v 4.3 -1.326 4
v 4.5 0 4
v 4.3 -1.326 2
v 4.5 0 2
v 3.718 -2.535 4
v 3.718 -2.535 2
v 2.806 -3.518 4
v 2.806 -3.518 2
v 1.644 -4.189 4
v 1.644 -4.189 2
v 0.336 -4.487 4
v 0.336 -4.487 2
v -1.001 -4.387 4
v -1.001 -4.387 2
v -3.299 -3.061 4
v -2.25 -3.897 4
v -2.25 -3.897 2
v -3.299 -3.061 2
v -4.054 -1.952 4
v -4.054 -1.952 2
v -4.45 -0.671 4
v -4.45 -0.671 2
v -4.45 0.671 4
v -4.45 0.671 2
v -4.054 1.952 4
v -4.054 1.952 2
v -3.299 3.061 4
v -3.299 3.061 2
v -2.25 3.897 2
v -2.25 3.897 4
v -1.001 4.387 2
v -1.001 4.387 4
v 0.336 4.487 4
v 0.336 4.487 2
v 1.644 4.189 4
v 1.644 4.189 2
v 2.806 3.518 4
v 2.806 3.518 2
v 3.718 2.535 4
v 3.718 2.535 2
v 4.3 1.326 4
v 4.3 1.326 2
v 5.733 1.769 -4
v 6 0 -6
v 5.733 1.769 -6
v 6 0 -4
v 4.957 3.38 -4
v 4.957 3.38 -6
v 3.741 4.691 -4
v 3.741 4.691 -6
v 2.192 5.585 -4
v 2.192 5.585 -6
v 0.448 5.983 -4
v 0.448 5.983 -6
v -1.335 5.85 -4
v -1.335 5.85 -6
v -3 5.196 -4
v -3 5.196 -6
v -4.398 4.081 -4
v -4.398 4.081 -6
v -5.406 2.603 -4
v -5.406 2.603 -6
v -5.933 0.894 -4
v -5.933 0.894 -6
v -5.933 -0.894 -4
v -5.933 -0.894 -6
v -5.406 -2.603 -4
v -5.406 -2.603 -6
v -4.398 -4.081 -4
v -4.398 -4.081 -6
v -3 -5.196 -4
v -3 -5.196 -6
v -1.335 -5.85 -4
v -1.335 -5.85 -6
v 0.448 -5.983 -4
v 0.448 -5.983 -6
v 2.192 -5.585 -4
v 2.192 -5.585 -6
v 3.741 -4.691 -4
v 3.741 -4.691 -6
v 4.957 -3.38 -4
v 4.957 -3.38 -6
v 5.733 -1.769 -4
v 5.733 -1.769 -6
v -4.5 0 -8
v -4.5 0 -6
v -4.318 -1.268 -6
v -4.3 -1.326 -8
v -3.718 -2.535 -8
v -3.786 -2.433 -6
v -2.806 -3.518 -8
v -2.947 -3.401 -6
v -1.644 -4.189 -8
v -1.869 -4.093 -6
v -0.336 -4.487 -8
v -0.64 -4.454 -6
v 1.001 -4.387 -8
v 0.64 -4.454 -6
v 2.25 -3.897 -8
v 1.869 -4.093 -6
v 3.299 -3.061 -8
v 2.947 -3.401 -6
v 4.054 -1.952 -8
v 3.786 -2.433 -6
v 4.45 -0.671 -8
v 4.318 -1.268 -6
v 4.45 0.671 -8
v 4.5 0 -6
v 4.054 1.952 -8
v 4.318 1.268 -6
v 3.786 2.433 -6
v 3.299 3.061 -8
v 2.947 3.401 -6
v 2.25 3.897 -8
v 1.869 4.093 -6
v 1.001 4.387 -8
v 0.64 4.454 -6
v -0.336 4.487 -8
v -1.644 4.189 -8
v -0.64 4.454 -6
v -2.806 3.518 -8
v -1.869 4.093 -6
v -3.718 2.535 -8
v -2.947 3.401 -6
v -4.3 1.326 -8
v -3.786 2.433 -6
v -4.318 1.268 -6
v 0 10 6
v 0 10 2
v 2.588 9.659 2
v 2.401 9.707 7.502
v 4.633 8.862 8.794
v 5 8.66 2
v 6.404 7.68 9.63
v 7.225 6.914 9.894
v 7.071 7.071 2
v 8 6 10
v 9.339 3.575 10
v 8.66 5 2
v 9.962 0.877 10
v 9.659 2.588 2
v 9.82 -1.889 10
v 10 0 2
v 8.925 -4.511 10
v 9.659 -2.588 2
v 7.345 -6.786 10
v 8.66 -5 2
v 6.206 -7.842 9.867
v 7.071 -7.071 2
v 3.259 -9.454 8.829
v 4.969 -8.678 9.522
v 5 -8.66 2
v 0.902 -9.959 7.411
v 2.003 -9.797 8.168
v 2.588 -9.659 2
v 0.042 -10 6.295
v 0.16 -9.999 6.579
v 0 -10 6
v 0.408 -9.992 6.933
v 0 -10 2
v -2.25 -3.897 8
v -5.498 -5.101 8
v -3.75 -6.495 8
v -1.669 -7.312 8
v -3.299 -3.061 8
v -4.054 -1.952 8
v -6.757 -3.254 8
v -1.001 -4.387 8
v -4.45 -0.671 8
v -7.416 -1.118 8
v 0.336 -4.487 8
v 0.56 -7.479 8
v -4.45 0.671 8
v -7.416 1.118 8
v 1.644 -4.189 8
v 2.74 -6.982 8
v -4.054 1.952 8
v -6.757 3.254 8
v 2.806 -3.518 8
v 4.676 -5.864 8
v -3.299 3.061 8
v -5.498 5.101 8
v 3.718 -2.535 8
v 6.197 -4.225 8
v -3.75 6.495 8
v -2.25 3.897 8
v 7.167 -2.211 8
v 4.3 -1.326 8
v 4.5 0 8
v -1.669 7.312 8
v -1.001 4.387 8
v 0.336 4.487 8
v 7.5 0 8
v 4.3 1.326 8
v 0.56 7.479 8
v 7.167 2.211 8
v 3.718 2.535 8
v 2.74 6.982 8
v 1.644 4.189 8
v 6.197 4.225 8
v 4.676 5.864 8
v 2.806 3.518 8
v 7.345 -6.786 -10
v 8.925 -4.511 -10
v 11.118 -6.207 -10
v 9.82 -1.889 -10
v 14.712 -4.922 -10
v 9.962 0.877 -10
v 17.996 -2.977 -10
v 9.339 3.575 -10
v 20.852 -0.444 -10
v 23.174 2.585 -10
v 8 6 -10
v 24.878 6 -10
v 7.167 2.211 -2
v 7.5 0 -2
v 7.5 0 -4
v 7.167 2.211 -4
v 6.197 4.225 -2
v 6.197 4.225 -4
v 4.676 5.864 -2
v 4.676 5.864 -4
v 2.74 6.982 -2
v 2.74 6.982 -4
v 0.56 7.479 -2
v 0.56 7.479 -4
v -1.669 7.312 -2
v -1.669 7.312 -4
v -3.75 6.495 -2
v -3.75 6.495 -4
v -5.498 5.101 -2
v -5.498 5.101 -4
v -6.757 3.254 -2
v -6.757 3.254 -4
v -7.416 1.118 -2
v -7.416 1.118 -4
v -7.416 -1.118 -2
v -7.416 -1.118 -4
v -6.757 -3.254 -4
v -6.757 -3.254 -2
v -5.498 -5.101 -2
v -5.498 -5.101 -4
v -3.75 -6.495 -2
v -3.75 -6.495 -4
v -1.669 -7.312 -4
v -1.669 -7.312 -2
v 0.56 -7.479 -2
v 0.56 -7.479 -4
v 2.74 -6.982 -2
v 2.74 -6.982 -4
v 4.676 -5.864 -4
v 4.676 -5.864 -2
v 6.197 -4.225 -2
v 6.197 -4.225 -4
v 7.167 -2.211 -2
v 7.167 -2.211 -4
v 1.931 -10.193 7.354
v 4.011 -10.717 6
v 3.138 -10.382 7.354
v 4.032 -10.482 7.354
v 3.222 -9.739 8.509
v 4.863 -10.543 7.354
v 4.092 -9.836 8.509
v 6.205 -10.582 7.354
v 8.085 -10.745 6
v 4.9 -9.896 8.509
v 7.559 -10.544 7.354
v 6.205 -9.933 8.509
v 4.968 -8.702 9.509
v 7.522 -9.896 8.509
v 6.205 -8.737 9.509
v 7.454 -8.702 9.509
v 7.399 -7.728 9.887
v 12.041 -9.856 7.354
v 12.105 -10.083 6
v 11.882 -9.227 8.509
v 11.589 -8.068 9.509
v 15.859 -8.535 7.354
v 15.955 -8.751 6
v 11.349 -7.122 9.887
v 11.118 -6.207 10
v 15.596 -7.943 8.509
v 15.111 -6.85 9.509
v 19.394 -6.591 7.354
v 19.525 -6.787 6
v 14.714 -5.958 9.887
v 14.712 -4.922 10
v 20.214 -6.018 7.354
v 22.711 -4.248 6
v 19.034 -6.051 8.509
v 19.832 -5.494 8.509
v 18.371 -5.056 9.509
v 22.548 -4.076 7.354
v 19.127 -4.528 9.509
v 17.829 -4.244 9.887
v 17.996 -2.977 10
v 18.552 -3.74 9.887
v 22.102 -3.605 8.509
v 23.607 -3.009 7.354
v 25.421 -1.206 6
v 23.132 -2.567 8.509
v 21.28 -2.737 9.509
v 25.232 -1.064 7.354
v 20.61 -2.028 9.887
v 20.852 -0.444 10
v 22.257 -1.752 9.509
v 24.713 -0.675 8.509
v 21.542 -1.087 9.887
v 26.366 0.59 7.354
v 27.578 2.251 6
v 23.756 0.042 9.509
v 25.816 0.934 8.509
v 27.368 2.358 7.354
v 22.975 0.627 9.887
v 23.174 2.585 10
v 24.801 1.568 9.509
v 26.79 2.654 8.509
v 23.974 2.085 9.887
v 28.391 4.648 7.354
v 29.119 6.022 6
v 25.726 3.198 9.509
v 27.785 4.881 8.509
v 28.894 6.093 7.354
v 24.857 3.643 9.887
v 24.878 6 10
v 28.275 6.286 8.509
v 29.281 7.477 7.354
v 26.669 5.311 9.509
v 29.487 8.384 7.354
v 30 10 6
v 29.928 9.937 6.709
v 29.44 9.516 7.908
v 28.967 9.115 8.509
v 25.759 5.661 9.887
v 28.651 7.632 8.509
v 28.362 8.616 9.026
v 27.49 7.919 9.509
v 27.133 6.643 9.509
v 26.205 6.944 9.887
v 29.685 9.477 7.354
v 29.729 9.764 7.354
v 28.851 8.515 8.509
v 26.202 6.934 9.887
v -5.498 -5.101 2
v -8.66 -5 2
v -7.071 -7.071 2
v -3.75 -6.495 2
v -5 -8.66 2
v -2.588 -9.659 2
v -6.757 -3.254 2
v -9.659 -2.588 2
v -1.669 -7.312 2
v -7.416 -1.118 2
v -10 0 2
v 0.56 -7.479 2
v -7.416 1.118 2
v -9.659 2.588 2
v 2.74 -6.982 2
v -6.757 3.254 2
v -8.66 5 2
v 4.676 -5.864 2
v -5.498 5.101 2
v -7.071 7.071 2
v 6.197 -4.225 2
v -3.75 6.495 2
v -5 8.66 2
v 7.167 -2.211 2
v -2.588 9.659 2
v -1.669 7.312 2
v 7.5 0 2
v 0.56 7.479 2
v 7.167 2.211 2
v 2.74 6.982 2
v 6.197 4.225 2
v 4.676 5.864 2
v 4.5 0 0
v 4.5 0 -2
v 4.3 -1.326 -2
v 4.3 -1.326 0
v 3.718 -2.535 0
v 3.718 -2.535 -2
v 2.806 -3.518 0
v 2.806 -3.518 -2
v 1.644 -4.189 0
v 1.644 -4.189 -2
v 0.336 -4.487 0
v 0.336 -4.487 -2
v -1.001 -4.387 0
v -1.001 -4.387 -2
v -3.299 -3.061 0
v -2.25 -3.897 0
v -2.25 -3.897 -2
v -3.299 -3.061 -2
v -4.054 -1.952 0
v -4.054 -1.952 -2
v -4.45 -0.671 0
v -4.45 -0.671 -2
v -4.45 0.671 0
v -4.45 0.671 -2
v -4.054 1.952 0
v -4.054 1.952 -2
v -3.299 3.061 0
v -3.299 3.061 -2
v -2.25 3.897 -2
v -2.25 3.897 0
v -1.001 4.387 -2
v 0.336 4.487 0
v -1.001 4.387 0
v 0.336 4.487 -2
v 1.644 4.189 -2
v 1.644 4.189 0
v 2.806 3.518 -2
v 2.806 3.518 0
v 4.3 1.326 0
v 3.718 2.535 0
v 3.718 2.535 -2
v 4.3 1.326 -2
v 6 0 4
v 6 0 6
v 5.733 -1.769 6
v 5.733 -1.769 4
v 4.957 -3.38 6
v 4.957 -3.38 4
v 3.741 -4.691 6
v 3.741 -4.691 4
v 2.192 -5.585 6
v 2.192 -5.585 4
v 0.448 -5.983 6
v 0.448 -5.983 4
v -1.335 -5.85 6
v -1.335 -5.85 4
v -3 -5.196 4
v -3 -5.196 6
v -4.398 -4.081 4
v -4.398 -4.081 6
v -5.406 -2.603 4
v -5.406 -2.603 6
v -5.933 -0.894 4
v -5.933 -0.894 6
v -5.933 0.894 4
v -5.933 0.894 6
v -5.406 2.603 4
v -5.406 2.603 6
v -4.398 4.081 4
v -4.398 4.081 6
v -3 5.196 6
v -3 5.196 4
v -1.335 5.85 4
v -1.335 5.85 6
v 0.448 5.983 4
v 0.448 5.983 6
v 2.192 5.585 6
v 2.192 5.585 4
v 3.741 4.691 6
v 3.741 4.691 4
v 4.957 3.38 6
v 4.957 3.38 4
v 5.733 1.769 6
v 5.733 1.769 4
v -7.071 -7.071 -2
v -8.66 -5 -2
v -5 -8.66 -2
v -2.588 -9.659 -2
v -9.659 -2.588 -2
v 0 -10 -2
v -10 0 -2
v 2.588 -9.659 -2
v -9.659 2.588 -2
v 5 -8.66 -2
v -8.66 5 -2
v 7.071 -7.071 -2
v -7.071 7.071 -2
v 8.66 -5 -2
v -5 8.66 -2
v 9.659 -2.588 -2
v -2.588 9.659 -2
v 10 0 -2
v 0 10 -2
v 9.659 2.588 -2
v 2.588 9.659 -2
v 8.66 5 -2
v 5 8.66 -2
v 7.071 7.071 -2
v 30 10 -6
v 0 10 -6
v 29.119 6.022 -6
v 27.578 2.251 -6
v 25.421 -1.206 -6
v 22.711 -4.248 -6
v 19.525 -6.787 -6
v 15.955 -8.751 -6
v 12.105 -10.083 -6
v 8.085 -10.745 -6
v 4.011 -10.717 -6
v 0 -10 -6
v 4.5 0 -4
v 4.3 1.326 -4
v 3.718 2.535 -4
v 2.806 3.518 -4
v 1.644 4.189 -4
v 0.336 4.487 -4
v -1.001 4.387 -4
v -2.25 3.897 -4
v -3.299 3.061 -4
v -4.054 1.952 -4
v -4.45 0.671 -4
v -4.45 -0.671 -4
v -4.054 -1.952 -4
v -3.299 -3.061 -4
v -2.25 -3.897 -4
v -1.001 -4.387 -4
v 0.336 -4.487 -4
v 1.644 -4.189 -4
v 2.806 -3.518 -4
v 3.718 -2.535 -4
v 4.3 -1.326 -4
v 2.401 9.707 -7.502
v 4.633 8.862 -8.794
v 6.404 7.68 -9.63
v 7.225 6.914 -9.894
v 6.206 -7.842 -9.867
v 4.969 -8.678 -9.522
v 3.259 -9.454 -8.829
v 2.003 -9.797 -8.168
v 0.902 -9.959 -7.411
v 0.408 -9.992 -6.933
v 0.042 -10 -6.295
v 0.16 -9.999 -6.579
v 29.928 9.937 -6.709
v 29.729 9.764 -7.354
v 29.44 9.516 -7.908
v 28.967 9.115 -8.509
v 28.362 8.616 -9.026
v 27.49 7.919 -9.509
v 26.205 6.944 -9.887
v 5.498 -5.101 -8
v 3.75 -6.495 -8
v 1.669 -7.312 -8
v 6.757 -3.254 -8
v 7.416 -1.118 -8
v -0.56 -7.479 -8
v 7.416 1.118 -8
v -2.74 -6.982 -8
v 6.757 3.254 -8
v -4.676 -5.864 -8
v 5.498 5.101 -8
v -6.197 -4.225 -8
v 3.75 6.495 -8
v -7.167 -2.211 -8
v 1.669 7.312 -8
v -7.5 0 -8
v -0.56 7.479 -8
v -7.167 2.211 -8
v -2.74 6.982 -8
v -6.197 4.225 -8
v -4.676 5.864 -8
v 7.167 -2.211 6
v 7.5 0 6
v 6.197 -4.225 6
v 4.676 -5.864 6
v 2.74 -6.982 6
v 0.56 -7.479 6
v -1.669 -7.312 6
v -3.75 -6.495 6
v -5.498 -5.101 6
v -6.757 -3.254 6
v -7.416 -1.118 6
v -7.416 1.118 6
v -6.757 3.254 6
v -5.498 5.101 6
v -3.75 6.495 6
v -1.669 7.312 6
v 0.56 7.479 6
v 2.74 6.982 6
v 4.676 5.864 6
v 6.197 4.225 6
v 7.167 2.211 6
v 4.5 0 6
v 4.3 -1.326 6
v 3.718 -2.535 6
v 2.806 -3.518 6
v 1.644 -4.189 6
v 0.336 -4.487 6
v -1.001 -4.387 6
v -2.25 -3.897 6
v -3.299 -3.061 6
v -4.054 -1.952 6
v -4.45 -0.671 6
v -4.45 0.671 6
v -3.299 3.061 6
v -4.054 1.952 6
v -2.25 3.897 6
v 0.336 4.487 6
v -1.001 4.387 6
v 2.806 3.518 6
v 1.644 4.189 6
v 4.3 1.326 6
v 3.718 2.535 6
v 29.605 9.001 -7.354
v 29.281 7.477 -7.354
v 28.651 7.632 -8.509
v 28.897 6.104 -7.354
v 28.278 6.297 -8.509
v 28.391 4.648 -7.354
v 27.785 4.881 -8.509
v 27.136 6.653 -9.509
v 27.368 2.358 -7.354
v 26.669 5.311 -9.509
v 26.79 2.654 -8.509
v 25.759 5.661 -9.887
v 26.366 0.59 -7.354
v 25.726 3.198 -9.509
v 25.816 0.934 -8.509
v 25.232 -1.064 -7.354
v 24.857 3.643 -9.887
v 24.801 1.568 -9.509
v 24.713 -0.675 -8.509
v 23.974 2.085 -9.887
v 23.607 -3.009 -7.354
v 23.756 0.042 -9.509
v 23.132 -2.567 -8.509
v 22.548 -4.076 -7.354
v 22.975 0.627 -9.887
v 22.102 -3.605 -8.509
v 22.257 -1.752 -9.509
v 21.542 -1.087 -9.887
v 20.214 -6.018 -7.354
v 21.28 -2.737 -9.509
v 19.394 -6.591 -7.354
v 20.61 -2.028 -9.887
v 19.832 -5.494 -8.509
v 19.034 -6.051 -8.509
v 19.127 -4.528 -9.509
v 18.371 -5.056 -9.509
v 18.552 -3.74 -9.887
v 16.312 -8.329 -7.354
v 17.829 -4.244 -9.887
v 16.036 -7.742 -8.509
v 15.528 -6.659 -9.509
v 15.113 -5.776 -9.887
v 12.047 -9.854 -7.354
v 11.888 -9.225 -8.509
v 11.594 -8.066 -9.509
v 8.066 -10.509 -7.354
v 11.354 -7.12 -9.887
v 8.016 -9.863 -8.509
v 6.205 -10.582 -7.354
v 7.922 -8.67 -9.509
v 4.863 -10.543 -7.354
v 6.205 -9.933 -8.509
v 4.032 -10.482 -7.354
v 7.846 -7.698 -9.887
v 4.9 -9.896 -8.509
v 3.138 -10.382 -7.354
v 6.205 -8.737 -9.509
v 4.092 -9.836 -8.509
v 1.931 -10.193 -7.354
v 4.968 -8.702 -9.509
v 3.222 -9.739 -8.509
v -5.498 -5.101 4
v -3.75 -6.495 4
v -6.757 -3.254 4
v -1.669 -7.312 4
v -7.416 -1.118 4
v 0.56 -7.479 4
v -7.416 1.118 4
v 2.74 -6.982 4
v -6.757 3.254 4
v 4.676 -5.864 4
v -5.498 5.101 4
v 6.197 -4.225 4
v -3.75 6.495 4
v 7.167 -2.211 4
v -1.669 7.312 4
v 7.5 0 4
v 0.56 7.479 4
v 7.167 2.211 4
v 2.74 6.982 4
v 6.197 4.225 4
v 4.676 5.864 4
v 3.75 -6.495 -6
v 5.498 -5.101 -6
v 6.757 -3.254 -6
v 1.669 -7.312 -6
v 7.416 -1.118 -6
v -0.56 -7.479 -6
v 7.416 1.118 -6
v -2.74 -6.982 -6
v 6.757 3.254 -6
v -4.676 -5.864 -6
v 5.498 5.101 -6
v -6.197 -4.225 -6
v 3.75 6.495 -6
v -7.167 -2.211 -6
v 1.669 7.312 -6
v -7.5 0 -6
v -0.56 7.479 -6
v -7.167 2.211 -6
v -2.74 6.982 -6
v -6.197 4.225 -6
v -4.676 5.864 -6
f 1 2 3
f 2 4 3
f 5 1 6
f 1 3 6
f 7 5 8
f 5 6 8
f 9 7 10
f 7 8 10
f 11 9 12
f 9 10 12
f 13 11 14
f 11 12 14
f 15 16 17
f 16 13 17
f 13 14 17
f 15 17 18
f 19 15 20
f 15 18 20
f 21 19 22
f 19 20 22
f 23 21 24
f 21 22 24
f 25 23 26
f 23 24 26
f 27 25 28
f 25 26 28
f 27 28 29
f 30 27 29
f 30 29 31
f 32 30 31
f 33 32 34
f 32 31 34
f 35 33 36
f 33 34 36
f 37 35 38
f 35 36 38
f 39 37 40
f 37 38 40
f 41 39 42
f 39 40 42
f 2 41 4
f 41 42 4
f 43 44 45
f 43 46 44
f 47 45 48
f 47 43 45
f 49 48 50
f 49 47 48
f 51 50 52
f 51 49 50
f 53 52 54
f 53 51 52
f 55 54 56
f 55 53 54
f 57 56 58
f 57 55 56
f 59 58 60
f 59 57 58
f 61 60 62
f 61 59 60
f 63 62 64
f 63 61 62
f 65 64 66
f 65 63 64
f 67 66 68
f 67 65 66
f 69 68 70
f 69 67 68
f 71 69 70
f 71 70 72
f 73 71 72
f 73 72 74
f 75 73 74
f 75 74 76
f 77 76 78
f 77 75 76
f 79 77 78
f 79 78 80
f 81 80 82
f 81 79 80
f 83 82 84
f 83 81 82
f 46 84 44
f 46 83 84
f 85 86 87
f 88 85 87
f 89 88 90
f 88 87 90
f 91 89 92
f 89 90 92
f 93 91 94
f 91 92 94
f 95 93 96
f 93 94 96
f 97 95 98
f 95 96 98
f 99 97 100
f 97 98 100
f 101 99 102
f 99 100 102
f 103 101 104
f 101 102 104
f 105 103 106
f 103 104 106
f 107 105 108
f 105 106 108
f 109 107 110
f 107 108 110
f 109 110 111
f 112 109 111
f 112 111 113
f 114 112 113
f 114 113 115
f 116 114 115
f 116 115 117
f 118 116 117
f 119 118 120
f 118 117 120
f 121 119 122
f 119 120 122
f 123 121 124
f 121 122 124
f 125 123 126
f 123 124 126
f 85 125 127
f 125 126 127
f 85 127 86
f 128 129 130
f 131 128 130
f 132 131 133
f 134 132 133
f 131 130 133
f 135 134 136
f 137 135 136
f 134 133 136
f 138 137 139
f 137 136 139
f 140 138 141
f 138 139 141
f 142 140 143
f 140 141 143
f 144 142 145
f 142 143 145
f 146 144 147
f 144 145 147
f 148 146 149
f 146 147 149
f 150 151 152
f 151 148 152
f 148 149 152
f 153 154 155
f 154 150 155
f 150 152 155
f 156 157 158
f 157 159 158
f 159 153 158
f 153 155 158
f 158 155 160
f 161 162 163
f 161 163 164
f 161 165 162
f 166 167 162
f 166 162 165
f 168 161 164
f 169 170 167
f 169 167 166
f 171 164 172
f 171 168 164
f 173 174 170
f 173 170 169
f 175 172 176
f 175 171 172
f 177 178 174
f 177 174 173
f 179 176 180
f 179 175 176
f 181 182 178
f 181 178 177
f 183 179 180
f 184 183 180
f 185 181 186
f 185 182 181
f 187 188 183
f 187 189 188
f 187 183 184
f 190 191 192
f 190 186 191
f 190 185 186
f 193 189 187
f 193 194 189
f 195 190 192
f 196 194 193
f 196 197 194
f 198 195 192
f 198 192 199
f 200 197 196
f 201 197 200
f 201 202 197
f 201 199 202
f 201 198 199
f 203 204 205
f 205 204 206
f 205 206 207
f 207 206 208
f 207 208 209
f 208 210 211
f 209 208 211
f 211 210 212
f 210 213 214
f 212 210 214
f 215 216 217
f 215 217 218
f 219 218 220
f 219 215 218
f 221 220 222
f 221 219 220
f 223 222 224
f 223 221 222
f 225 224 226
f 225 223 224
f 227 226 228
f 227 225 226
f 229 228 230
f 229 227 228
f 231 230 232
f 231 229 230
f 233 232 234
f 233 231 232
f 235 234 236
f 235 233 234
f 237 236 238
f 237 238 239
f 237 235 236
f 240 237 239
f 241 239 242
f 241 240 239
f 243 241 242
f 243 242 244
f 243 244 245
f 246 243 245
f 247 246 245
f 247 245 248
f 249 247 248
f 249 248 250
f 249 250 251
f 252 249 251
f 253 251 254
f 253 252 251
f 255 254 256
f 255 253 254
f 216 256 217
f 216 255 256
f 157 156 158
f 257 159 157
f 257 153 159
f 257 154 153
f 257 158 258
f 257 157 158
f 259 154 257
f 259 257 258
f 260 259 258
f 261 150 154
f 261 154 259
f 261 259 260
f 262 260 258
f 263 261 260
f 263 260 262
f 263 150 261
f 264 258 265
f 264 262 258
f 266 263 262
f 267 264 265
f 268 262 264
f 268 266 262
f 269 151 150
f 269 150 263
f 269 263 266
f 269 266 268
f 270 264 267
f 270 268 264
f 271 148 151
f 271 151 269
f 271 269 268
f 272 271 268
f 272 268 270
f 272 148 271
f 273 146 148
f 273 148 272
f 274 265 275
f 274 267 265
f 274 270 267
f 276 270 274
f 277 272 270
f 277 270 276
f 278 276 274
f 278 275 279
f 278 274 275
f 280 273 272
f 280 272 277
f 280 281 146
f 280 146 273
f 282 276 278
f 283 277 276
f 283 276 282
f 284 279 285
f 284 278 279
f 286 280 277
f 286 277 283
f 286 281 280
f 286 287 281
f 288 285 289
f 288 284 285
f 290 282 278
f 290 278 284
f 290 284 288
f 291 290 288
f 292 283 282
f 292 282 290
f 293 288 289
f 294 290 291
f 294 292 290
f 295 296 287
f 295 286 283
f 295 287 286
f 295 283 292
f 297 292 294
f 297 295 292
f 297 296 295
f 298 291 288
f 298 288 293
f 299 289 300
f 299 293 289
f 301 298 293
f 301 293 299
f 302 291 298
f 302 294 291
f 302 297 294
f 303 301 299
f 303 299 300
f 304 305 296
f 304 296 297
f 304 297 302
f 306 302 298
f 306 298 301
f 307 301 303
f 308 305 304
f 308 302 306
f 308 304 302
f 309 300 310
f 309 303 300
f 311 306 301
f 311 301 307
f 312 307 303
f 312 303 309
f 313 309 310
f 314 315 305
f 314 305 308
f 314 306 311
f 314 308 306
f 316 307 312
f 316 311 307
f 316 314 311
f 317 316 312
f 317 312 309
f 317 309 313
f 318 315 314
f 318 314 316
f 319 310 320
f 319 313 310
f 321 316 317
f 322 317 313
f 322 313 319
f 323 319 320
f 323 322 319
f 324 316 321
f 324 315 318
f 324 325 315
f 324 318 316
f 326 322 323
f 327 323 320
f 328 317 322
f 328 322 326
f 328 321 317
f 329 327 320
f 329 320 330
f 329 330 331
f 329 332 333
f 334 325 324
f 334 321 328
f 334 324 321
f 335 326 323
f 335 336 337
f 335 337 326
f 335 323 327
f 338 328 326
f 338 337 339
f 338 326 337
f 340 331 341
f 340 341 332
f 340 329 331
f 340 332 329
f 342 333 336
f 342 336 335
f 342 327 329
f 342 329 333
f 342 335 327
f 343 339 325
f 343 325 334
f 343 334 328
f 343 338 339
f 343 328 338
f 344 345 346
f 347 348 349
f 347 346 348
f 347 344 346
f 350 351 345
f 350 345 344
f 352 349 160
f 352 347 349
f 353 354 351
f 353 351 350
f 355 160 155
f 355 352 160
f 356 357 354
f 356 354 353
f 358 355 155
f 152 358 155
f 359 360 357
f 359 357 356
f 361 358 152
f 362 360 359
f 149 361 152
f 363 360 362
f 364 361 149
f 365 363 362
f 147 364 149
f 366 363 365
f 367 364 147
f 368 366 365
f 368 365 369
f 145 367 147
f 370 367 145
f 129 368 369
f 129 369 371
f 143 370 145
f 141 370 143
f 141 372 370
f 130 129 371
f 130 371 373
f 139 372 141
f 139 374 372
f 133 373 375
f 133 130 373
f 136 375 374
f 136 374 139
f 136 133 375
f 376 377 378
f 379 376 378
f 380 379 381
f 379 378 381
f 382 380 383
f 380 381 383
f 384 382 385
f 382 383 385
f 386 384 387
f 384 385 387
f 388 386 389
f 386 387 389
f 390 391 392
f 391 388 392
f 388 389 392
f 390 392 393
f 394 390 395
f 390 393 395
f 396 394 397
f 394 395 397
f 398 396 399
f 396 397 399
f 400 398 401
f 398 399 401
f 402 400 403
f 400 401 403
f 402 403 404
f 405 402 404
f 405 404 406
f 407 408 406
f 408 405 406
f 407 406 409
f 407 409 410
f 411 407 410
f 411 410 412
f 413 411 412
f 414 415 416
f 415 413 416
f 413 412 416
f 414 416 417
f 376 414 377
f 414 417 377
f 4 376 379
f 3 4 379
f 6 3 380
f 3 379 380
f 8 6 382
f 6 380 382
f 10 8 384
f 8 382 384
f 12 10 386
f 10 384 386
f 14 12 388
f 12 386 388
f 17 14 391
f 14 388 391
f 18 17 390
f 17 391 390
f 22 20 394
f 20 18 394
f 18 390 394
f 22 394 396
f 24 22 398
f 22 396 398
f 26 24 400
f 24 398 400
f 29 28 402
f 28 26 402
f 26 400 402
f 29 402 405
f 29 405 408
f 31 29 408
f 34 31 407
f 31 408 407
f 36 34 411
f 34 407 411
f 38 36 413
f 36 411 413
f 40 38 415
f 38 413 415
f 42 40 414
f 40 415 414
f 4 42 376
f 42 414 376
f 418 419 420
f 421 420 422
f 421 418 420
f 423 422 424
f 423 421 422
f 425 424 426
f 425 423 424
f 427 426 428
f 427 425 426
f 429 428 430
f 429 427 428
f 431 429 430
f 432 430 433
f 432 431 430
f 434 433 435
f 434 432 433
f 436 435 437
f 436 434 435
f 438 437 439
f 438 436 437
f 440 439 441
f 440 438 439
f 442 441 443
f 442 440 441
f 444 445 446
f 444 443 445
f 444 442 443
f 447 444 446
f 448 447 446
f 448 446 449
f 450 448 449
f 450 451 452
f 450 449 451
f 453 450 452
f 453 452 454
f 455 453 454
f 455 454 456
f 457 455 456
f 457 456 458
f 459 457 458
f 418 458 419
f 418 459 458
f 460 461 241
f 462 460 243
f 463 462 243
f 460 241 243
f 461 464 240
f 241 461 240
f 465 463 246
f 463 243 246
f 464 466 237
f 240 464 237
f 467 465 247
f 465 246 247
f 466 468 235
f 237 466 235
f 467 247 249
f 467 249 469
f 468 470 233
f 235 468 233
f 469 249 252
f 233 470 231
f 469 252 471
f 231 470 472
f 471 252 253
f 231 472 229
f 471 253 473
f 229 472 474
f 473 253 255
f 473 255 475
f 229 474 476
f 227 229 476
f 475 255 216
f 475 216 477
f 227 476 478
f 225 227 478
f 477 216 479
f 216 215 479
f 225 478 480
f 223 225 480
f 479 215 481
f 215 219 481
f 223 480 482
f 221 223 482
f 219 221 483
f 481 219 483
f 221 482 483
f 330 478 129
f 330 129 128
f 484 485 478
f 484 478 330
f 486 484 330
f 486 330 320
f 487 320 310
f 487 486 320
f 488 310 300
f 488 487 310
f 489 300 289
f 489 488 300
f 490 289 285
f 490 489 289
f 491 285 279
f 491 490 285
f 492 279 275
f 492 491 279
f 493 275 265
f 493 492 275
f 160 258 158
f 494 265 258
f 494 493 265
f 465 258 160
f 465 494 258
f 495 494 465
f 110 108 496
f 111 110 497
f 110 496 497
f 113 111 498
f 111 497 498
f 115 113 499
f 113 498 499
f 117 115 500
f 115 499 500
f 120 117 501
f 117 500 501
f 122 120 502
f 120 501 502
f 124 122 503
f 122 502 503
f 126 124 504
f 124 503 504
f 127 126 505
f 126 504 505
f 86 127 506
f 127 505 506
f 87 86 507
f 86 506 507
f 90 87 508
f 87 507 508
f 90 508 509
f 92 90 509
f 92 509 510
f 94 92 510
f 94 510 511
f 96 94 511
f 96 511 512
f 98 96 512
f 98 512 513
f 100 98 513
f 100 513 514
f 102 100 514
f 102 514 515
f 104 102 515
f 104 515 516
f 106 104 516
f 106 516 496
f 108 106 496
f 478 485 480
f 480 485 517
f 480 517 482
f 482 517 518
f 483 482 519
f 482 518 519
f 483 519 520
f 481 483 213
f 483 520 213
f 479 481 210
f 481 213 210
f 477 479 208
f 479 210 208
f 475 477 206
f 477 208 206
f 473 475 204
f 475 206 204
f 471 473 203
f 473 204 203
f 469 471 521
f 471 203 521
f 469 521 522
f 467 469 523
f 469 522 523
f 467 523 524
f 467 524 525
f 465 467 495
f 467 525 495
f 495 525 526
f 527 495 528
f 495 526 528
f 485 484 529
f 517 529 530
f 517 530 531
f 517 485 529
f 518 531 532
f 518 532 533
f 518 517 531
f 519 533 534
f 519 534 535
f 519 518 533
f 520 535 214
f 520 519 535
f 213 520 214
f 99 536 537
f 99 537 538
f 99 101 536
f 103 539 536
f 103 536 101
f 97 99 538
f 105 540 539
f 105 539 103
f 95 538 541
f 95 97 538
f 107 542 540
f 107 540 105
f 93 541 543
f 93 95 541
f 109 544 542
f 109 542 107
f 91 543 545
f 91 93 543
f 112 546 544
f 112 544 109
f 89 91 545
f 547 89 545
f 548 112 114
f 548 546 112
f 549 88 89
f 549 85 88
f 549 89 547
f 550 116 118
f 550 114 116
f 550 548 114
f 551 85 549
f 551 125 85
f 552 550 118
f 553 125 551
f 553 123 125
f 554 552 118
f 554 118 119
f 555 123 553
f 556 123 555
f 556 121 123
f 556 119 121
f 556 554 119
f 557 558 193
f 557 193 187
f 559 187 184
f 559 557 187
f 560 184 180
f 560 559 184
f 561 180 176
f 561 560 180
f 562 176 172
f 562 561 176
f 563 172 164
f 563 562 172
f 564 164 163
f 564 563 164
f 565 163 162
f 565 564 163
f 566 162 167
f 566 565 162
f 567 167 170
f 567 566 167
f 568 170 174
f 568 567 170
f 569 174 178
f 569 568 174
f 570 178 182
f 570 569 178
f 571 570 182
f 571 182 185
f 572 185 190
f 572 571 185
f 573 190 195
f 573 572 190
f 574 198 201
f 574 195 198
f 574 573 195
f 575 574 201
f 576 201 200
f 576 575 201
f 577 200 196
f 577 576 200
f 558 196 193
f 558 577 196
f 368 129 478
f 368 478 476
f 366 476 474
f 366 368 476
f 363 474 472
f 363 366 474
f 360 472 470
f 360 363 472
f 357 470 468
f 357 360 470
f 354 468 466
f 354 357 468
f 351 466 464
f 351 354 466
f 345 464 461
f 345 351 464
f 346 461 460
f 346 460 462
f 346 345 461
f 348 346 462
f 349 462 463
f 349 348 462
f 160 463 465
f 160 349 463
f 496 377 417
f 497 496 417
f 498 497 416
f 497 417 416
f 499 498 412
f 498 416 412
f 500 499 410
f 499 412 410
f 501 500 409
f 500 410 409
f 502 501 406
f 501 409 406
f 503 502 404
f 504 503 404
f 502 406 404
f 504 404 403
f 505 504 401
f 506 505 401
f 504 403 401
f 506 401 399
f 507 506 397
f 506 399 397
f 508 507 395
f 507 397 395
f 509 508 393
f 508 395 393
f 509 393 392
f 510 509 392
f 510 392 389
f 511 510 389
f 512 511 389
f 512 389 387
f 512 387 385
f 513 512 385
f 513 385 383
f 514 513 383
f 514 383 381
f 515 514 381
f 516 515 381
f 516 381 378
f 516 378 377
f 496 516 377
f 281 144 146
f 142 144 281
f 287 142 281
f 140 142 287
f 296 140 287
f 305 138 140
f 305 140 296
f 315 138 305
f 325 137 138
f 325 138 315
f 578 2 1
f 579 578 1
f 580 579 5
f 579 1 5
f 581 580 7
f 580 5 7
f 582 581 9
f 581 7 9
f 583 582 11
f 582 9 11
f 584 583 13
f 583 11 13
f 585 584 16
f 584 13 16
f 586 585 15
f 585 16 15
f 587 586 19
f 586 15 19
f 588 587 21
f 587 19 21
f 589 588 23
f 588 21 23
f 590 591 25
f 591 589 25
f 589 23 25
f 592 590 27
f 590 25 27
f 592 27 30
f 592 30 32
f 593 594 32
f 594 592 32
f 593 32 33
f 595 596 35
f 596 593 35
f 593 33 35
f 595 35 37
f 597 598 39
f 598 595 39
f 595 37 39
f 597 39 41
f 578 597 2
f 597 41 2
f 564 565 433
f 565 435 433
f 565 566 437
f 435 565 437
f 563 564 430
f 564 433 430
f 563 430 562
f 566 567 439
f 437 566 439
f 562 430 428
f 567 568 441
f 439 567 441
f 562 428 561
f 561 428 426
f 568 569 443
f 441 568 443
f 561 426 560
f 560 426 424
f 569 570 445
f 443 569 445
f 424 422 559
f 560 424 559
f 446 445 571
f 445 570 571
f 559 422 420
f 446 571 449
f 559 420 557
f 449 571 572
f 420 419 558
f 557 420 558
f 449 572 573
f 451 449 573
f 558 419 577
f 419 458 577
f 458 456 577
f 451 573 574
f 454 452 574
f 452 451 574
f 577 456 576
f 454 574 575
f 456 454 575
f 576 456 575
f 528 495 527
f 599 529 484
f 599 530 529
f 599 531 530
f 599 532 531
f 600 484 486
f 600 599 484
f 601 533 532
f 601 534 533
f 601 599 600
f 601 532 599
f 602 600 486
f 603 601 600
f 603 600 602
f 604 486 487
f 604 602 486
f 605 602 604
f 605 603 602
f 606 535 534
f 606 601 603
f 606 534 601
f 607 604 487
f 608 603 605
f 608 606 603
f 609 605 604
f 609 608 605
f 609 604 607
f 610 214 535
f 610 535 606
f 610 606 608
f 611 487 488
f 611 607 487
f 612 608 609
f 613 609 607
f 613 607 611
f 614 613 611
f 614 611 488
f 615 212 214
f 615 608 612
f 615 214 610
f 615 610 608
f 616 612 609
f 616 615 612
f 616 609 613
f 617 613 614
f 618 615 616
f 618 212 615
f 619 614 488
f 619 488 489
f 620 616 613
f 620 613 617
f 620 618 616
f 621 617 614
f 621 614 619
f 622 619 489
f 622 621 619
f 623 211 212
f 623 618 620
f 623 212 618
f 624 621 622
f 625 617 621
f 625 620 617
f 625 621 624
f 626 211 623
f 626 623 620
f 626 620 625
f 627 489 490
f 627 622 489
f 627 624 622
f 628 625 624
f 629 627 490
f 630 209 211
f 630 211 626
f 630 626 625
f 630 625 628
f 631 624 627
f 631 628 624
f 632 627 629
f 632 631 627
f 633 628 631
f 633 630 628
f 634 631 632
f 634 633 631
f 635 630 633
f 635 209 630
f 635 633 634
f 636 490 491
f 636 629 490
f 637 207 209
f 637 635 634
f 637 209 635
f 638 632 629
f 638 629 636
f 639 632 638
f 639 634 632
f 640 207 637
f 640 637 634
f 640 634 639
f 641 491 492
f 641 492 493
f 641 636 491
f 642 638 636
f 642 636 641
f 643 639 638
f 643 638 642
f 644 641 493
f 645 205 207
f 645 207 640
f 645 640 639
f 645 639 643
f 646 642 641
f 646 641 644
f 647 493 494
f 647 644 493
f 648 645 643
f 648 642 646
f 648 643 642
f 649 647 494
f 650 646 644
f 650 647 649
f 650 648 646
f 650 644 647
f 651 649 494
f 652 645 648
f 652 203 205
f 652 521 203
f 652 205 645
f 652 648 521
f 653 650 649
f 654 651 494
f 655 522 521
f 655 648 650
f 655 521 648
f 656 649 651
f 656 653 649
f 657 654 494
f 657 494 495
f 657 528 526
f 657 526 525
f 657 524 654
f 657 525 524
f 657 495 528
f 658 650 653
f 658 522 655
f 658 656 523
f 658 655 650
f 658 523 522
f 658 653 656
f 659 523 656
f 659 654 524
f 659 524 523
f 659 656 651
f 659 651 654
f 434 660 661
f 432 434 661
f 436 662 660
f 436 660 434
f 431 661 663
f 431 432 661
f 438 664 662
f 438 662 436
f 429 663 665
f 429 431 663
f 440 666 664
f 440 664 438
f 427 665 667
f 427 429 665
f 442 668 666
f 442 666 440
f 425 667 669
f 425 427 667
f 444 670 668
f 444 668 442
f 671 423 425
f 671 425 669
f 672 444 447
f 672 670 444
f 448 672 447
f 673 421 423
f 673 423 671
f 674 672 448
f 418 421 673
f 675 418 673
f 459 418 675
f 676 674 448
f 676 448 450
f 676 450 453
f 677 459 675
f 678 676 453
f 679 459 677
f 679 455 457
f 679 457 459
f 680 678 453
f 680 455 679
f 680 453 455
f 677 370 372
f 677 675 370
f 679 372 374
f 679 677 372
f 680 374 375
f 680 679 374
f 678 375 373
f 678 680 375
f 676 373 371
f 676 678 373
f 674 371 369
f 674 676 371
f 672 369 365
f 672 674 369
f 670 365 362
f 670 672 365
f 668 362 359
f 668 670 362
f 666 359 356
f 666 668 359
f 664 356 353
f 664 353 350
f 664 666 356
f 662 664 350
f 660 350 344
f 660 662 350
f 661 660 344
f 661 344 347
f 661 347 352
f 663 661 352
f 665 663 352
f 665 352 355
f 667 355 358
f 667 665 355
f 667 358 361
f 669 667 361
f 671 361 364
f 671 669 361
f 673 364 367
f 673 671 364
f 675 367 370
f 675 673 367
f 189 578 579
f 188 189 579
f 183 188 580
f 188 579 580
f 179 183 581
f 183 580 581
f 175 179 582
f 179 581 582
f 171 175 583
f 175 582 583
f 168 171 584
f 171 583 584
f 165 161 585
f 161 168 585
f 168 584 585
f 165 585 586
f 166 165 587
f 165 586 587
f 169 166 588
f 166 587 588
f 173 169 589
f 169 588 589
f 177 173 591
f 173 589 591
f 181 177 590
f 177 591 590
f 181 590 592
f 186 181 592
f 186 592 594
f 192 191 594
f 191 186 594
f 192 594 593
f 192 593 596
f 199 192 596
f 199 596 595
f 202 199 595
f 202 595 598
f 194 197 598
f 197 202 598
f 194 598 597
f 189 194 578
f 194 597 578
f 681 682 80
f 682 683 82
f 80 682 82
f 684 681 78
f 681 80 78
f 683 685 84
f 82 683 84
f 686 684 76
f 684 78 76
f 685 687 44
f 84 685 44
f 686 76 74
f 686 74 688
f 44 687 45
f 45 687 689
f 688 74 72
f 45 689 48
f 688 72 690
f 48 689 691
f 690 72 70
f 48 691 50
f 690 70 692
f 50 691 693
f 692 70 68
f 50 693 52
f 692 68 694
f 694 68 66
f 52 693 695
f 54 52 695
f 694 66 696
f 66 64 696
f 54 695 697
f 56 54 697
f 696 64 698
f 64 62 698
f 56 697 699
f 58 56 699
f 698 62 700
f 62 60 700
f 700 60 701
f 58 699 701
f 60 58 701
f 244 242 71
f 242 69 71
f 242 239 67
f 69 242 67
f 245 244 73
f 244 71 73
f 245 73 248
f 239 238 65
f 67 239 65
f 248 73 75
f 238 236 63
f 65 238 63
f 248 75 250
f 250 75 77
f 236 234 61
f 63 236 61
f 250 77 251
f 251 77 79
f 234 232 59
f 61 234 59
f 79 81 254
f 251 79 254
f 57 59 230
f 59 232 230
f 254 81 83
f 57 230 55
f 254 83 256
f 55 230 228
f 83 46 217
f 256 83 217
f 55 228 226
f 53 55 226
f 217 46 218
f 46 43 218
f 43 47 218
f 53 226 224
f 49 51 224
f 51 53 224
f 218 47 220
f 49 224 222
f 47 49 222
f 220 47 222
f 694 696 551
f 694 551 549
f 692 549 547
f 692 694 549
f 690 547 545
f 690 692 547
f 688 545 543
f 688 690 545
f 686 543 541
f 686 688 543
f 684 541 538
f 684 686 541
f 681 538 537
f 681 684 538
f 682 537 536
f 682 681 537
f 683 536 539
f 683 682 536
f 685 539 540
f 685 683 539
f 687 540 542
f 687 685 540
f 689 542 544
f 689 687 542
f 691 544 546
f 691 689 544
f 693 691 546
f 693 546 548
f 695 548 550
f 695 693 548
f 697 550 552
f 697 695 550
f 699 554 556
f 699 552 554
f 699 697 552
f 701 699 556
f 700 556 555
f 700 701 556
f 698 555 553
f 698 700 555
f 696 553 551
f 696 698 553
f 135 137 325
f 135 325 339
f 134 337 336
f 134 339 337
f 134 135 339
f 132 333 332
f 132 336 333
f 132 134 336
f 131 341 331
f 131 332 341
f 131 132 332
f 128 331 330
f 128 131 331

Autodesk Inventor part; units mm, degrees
ref_plane "YZ Plane" through (0, 0, 0) normal (1, 0, 0) x (0, 1, 0)
ref_plane "XZ Plane" through (0, 0, 0) normal (0, 1, 0) x (-1, 0, 0)
ref_plane "XY Plane" through (0, 0, 0) normal (0, 0, 1) x (1, 0, 0)
sketch "Sketch1" plane through (0, 0, 0) normal (0, 0, 1) x (1, 0, 0)
  circle A0 centre (0, 0) radius 10
  line L0 (0, 10) -> (30, 10)
  arc A1 (0, -10) -> (30, 10) centre (6.2119, 13.1822) ccw
  circle A2 centre (0, 0) radius 4.5
  circle A3 centre (0, 0) radius 7.5
  circle A4 centre (0, 0) radius 6
  dimension "d0" = 20
  dimension "d1" = 30
  dimension "d2" = 24
  dimension "d3" = 10
  dimension "d4" = 13.1822
  dimension "d5" = 9
  dimension "d6" = 15
  dimension "d7" = 12
extrude "Extrusion1" add sketch "Sketch1" along normal mid plane 20 contours A0 L0 A1
extrude "Extrusion2" add sketch "Sketch1" along normal mid plane 4 contours A0 | A3 | A4
extrude "Extrusion3" add sketch "Sketch1" along normal mid plane 8 contours A3 | A4
extrude "Extrusion4" add sketch "Sketch1" along normal mid plane 12 contours A4
sketch "Sketch2" plane through (0, 0, 6) normal (0, 0, 1) x (1, 0, 0)
  circle A0 centre (0, 0) radius 7.5
  circle A1 centre (0, 0) radius 4.5
  dimension "d16" = 15
  dimension "d18" = 9
sketch "Sketch3" plane through (0, 0, -6) normal (0, 0, -1) x (-1, 0, 0)
  circle A0 centre (0, 0) radius 7.5
  circle A1 centre (0, 0) radius 4.5
  dimension "d17" = 15
  dimension "d19" = 9
extrude "Extrusion5" add sketch "Sketch3" along normal blind 2
extrude "Extrusion6" add sketch "Sketch2" along normal blind 2
fillet "Fillet1" radius 4 4 edges at (15, 10, -10) (19.5247, -6.7871, -10) (19.5247, -6.7871, 10) (15, 10, 10)
properties part number "TapPart"
